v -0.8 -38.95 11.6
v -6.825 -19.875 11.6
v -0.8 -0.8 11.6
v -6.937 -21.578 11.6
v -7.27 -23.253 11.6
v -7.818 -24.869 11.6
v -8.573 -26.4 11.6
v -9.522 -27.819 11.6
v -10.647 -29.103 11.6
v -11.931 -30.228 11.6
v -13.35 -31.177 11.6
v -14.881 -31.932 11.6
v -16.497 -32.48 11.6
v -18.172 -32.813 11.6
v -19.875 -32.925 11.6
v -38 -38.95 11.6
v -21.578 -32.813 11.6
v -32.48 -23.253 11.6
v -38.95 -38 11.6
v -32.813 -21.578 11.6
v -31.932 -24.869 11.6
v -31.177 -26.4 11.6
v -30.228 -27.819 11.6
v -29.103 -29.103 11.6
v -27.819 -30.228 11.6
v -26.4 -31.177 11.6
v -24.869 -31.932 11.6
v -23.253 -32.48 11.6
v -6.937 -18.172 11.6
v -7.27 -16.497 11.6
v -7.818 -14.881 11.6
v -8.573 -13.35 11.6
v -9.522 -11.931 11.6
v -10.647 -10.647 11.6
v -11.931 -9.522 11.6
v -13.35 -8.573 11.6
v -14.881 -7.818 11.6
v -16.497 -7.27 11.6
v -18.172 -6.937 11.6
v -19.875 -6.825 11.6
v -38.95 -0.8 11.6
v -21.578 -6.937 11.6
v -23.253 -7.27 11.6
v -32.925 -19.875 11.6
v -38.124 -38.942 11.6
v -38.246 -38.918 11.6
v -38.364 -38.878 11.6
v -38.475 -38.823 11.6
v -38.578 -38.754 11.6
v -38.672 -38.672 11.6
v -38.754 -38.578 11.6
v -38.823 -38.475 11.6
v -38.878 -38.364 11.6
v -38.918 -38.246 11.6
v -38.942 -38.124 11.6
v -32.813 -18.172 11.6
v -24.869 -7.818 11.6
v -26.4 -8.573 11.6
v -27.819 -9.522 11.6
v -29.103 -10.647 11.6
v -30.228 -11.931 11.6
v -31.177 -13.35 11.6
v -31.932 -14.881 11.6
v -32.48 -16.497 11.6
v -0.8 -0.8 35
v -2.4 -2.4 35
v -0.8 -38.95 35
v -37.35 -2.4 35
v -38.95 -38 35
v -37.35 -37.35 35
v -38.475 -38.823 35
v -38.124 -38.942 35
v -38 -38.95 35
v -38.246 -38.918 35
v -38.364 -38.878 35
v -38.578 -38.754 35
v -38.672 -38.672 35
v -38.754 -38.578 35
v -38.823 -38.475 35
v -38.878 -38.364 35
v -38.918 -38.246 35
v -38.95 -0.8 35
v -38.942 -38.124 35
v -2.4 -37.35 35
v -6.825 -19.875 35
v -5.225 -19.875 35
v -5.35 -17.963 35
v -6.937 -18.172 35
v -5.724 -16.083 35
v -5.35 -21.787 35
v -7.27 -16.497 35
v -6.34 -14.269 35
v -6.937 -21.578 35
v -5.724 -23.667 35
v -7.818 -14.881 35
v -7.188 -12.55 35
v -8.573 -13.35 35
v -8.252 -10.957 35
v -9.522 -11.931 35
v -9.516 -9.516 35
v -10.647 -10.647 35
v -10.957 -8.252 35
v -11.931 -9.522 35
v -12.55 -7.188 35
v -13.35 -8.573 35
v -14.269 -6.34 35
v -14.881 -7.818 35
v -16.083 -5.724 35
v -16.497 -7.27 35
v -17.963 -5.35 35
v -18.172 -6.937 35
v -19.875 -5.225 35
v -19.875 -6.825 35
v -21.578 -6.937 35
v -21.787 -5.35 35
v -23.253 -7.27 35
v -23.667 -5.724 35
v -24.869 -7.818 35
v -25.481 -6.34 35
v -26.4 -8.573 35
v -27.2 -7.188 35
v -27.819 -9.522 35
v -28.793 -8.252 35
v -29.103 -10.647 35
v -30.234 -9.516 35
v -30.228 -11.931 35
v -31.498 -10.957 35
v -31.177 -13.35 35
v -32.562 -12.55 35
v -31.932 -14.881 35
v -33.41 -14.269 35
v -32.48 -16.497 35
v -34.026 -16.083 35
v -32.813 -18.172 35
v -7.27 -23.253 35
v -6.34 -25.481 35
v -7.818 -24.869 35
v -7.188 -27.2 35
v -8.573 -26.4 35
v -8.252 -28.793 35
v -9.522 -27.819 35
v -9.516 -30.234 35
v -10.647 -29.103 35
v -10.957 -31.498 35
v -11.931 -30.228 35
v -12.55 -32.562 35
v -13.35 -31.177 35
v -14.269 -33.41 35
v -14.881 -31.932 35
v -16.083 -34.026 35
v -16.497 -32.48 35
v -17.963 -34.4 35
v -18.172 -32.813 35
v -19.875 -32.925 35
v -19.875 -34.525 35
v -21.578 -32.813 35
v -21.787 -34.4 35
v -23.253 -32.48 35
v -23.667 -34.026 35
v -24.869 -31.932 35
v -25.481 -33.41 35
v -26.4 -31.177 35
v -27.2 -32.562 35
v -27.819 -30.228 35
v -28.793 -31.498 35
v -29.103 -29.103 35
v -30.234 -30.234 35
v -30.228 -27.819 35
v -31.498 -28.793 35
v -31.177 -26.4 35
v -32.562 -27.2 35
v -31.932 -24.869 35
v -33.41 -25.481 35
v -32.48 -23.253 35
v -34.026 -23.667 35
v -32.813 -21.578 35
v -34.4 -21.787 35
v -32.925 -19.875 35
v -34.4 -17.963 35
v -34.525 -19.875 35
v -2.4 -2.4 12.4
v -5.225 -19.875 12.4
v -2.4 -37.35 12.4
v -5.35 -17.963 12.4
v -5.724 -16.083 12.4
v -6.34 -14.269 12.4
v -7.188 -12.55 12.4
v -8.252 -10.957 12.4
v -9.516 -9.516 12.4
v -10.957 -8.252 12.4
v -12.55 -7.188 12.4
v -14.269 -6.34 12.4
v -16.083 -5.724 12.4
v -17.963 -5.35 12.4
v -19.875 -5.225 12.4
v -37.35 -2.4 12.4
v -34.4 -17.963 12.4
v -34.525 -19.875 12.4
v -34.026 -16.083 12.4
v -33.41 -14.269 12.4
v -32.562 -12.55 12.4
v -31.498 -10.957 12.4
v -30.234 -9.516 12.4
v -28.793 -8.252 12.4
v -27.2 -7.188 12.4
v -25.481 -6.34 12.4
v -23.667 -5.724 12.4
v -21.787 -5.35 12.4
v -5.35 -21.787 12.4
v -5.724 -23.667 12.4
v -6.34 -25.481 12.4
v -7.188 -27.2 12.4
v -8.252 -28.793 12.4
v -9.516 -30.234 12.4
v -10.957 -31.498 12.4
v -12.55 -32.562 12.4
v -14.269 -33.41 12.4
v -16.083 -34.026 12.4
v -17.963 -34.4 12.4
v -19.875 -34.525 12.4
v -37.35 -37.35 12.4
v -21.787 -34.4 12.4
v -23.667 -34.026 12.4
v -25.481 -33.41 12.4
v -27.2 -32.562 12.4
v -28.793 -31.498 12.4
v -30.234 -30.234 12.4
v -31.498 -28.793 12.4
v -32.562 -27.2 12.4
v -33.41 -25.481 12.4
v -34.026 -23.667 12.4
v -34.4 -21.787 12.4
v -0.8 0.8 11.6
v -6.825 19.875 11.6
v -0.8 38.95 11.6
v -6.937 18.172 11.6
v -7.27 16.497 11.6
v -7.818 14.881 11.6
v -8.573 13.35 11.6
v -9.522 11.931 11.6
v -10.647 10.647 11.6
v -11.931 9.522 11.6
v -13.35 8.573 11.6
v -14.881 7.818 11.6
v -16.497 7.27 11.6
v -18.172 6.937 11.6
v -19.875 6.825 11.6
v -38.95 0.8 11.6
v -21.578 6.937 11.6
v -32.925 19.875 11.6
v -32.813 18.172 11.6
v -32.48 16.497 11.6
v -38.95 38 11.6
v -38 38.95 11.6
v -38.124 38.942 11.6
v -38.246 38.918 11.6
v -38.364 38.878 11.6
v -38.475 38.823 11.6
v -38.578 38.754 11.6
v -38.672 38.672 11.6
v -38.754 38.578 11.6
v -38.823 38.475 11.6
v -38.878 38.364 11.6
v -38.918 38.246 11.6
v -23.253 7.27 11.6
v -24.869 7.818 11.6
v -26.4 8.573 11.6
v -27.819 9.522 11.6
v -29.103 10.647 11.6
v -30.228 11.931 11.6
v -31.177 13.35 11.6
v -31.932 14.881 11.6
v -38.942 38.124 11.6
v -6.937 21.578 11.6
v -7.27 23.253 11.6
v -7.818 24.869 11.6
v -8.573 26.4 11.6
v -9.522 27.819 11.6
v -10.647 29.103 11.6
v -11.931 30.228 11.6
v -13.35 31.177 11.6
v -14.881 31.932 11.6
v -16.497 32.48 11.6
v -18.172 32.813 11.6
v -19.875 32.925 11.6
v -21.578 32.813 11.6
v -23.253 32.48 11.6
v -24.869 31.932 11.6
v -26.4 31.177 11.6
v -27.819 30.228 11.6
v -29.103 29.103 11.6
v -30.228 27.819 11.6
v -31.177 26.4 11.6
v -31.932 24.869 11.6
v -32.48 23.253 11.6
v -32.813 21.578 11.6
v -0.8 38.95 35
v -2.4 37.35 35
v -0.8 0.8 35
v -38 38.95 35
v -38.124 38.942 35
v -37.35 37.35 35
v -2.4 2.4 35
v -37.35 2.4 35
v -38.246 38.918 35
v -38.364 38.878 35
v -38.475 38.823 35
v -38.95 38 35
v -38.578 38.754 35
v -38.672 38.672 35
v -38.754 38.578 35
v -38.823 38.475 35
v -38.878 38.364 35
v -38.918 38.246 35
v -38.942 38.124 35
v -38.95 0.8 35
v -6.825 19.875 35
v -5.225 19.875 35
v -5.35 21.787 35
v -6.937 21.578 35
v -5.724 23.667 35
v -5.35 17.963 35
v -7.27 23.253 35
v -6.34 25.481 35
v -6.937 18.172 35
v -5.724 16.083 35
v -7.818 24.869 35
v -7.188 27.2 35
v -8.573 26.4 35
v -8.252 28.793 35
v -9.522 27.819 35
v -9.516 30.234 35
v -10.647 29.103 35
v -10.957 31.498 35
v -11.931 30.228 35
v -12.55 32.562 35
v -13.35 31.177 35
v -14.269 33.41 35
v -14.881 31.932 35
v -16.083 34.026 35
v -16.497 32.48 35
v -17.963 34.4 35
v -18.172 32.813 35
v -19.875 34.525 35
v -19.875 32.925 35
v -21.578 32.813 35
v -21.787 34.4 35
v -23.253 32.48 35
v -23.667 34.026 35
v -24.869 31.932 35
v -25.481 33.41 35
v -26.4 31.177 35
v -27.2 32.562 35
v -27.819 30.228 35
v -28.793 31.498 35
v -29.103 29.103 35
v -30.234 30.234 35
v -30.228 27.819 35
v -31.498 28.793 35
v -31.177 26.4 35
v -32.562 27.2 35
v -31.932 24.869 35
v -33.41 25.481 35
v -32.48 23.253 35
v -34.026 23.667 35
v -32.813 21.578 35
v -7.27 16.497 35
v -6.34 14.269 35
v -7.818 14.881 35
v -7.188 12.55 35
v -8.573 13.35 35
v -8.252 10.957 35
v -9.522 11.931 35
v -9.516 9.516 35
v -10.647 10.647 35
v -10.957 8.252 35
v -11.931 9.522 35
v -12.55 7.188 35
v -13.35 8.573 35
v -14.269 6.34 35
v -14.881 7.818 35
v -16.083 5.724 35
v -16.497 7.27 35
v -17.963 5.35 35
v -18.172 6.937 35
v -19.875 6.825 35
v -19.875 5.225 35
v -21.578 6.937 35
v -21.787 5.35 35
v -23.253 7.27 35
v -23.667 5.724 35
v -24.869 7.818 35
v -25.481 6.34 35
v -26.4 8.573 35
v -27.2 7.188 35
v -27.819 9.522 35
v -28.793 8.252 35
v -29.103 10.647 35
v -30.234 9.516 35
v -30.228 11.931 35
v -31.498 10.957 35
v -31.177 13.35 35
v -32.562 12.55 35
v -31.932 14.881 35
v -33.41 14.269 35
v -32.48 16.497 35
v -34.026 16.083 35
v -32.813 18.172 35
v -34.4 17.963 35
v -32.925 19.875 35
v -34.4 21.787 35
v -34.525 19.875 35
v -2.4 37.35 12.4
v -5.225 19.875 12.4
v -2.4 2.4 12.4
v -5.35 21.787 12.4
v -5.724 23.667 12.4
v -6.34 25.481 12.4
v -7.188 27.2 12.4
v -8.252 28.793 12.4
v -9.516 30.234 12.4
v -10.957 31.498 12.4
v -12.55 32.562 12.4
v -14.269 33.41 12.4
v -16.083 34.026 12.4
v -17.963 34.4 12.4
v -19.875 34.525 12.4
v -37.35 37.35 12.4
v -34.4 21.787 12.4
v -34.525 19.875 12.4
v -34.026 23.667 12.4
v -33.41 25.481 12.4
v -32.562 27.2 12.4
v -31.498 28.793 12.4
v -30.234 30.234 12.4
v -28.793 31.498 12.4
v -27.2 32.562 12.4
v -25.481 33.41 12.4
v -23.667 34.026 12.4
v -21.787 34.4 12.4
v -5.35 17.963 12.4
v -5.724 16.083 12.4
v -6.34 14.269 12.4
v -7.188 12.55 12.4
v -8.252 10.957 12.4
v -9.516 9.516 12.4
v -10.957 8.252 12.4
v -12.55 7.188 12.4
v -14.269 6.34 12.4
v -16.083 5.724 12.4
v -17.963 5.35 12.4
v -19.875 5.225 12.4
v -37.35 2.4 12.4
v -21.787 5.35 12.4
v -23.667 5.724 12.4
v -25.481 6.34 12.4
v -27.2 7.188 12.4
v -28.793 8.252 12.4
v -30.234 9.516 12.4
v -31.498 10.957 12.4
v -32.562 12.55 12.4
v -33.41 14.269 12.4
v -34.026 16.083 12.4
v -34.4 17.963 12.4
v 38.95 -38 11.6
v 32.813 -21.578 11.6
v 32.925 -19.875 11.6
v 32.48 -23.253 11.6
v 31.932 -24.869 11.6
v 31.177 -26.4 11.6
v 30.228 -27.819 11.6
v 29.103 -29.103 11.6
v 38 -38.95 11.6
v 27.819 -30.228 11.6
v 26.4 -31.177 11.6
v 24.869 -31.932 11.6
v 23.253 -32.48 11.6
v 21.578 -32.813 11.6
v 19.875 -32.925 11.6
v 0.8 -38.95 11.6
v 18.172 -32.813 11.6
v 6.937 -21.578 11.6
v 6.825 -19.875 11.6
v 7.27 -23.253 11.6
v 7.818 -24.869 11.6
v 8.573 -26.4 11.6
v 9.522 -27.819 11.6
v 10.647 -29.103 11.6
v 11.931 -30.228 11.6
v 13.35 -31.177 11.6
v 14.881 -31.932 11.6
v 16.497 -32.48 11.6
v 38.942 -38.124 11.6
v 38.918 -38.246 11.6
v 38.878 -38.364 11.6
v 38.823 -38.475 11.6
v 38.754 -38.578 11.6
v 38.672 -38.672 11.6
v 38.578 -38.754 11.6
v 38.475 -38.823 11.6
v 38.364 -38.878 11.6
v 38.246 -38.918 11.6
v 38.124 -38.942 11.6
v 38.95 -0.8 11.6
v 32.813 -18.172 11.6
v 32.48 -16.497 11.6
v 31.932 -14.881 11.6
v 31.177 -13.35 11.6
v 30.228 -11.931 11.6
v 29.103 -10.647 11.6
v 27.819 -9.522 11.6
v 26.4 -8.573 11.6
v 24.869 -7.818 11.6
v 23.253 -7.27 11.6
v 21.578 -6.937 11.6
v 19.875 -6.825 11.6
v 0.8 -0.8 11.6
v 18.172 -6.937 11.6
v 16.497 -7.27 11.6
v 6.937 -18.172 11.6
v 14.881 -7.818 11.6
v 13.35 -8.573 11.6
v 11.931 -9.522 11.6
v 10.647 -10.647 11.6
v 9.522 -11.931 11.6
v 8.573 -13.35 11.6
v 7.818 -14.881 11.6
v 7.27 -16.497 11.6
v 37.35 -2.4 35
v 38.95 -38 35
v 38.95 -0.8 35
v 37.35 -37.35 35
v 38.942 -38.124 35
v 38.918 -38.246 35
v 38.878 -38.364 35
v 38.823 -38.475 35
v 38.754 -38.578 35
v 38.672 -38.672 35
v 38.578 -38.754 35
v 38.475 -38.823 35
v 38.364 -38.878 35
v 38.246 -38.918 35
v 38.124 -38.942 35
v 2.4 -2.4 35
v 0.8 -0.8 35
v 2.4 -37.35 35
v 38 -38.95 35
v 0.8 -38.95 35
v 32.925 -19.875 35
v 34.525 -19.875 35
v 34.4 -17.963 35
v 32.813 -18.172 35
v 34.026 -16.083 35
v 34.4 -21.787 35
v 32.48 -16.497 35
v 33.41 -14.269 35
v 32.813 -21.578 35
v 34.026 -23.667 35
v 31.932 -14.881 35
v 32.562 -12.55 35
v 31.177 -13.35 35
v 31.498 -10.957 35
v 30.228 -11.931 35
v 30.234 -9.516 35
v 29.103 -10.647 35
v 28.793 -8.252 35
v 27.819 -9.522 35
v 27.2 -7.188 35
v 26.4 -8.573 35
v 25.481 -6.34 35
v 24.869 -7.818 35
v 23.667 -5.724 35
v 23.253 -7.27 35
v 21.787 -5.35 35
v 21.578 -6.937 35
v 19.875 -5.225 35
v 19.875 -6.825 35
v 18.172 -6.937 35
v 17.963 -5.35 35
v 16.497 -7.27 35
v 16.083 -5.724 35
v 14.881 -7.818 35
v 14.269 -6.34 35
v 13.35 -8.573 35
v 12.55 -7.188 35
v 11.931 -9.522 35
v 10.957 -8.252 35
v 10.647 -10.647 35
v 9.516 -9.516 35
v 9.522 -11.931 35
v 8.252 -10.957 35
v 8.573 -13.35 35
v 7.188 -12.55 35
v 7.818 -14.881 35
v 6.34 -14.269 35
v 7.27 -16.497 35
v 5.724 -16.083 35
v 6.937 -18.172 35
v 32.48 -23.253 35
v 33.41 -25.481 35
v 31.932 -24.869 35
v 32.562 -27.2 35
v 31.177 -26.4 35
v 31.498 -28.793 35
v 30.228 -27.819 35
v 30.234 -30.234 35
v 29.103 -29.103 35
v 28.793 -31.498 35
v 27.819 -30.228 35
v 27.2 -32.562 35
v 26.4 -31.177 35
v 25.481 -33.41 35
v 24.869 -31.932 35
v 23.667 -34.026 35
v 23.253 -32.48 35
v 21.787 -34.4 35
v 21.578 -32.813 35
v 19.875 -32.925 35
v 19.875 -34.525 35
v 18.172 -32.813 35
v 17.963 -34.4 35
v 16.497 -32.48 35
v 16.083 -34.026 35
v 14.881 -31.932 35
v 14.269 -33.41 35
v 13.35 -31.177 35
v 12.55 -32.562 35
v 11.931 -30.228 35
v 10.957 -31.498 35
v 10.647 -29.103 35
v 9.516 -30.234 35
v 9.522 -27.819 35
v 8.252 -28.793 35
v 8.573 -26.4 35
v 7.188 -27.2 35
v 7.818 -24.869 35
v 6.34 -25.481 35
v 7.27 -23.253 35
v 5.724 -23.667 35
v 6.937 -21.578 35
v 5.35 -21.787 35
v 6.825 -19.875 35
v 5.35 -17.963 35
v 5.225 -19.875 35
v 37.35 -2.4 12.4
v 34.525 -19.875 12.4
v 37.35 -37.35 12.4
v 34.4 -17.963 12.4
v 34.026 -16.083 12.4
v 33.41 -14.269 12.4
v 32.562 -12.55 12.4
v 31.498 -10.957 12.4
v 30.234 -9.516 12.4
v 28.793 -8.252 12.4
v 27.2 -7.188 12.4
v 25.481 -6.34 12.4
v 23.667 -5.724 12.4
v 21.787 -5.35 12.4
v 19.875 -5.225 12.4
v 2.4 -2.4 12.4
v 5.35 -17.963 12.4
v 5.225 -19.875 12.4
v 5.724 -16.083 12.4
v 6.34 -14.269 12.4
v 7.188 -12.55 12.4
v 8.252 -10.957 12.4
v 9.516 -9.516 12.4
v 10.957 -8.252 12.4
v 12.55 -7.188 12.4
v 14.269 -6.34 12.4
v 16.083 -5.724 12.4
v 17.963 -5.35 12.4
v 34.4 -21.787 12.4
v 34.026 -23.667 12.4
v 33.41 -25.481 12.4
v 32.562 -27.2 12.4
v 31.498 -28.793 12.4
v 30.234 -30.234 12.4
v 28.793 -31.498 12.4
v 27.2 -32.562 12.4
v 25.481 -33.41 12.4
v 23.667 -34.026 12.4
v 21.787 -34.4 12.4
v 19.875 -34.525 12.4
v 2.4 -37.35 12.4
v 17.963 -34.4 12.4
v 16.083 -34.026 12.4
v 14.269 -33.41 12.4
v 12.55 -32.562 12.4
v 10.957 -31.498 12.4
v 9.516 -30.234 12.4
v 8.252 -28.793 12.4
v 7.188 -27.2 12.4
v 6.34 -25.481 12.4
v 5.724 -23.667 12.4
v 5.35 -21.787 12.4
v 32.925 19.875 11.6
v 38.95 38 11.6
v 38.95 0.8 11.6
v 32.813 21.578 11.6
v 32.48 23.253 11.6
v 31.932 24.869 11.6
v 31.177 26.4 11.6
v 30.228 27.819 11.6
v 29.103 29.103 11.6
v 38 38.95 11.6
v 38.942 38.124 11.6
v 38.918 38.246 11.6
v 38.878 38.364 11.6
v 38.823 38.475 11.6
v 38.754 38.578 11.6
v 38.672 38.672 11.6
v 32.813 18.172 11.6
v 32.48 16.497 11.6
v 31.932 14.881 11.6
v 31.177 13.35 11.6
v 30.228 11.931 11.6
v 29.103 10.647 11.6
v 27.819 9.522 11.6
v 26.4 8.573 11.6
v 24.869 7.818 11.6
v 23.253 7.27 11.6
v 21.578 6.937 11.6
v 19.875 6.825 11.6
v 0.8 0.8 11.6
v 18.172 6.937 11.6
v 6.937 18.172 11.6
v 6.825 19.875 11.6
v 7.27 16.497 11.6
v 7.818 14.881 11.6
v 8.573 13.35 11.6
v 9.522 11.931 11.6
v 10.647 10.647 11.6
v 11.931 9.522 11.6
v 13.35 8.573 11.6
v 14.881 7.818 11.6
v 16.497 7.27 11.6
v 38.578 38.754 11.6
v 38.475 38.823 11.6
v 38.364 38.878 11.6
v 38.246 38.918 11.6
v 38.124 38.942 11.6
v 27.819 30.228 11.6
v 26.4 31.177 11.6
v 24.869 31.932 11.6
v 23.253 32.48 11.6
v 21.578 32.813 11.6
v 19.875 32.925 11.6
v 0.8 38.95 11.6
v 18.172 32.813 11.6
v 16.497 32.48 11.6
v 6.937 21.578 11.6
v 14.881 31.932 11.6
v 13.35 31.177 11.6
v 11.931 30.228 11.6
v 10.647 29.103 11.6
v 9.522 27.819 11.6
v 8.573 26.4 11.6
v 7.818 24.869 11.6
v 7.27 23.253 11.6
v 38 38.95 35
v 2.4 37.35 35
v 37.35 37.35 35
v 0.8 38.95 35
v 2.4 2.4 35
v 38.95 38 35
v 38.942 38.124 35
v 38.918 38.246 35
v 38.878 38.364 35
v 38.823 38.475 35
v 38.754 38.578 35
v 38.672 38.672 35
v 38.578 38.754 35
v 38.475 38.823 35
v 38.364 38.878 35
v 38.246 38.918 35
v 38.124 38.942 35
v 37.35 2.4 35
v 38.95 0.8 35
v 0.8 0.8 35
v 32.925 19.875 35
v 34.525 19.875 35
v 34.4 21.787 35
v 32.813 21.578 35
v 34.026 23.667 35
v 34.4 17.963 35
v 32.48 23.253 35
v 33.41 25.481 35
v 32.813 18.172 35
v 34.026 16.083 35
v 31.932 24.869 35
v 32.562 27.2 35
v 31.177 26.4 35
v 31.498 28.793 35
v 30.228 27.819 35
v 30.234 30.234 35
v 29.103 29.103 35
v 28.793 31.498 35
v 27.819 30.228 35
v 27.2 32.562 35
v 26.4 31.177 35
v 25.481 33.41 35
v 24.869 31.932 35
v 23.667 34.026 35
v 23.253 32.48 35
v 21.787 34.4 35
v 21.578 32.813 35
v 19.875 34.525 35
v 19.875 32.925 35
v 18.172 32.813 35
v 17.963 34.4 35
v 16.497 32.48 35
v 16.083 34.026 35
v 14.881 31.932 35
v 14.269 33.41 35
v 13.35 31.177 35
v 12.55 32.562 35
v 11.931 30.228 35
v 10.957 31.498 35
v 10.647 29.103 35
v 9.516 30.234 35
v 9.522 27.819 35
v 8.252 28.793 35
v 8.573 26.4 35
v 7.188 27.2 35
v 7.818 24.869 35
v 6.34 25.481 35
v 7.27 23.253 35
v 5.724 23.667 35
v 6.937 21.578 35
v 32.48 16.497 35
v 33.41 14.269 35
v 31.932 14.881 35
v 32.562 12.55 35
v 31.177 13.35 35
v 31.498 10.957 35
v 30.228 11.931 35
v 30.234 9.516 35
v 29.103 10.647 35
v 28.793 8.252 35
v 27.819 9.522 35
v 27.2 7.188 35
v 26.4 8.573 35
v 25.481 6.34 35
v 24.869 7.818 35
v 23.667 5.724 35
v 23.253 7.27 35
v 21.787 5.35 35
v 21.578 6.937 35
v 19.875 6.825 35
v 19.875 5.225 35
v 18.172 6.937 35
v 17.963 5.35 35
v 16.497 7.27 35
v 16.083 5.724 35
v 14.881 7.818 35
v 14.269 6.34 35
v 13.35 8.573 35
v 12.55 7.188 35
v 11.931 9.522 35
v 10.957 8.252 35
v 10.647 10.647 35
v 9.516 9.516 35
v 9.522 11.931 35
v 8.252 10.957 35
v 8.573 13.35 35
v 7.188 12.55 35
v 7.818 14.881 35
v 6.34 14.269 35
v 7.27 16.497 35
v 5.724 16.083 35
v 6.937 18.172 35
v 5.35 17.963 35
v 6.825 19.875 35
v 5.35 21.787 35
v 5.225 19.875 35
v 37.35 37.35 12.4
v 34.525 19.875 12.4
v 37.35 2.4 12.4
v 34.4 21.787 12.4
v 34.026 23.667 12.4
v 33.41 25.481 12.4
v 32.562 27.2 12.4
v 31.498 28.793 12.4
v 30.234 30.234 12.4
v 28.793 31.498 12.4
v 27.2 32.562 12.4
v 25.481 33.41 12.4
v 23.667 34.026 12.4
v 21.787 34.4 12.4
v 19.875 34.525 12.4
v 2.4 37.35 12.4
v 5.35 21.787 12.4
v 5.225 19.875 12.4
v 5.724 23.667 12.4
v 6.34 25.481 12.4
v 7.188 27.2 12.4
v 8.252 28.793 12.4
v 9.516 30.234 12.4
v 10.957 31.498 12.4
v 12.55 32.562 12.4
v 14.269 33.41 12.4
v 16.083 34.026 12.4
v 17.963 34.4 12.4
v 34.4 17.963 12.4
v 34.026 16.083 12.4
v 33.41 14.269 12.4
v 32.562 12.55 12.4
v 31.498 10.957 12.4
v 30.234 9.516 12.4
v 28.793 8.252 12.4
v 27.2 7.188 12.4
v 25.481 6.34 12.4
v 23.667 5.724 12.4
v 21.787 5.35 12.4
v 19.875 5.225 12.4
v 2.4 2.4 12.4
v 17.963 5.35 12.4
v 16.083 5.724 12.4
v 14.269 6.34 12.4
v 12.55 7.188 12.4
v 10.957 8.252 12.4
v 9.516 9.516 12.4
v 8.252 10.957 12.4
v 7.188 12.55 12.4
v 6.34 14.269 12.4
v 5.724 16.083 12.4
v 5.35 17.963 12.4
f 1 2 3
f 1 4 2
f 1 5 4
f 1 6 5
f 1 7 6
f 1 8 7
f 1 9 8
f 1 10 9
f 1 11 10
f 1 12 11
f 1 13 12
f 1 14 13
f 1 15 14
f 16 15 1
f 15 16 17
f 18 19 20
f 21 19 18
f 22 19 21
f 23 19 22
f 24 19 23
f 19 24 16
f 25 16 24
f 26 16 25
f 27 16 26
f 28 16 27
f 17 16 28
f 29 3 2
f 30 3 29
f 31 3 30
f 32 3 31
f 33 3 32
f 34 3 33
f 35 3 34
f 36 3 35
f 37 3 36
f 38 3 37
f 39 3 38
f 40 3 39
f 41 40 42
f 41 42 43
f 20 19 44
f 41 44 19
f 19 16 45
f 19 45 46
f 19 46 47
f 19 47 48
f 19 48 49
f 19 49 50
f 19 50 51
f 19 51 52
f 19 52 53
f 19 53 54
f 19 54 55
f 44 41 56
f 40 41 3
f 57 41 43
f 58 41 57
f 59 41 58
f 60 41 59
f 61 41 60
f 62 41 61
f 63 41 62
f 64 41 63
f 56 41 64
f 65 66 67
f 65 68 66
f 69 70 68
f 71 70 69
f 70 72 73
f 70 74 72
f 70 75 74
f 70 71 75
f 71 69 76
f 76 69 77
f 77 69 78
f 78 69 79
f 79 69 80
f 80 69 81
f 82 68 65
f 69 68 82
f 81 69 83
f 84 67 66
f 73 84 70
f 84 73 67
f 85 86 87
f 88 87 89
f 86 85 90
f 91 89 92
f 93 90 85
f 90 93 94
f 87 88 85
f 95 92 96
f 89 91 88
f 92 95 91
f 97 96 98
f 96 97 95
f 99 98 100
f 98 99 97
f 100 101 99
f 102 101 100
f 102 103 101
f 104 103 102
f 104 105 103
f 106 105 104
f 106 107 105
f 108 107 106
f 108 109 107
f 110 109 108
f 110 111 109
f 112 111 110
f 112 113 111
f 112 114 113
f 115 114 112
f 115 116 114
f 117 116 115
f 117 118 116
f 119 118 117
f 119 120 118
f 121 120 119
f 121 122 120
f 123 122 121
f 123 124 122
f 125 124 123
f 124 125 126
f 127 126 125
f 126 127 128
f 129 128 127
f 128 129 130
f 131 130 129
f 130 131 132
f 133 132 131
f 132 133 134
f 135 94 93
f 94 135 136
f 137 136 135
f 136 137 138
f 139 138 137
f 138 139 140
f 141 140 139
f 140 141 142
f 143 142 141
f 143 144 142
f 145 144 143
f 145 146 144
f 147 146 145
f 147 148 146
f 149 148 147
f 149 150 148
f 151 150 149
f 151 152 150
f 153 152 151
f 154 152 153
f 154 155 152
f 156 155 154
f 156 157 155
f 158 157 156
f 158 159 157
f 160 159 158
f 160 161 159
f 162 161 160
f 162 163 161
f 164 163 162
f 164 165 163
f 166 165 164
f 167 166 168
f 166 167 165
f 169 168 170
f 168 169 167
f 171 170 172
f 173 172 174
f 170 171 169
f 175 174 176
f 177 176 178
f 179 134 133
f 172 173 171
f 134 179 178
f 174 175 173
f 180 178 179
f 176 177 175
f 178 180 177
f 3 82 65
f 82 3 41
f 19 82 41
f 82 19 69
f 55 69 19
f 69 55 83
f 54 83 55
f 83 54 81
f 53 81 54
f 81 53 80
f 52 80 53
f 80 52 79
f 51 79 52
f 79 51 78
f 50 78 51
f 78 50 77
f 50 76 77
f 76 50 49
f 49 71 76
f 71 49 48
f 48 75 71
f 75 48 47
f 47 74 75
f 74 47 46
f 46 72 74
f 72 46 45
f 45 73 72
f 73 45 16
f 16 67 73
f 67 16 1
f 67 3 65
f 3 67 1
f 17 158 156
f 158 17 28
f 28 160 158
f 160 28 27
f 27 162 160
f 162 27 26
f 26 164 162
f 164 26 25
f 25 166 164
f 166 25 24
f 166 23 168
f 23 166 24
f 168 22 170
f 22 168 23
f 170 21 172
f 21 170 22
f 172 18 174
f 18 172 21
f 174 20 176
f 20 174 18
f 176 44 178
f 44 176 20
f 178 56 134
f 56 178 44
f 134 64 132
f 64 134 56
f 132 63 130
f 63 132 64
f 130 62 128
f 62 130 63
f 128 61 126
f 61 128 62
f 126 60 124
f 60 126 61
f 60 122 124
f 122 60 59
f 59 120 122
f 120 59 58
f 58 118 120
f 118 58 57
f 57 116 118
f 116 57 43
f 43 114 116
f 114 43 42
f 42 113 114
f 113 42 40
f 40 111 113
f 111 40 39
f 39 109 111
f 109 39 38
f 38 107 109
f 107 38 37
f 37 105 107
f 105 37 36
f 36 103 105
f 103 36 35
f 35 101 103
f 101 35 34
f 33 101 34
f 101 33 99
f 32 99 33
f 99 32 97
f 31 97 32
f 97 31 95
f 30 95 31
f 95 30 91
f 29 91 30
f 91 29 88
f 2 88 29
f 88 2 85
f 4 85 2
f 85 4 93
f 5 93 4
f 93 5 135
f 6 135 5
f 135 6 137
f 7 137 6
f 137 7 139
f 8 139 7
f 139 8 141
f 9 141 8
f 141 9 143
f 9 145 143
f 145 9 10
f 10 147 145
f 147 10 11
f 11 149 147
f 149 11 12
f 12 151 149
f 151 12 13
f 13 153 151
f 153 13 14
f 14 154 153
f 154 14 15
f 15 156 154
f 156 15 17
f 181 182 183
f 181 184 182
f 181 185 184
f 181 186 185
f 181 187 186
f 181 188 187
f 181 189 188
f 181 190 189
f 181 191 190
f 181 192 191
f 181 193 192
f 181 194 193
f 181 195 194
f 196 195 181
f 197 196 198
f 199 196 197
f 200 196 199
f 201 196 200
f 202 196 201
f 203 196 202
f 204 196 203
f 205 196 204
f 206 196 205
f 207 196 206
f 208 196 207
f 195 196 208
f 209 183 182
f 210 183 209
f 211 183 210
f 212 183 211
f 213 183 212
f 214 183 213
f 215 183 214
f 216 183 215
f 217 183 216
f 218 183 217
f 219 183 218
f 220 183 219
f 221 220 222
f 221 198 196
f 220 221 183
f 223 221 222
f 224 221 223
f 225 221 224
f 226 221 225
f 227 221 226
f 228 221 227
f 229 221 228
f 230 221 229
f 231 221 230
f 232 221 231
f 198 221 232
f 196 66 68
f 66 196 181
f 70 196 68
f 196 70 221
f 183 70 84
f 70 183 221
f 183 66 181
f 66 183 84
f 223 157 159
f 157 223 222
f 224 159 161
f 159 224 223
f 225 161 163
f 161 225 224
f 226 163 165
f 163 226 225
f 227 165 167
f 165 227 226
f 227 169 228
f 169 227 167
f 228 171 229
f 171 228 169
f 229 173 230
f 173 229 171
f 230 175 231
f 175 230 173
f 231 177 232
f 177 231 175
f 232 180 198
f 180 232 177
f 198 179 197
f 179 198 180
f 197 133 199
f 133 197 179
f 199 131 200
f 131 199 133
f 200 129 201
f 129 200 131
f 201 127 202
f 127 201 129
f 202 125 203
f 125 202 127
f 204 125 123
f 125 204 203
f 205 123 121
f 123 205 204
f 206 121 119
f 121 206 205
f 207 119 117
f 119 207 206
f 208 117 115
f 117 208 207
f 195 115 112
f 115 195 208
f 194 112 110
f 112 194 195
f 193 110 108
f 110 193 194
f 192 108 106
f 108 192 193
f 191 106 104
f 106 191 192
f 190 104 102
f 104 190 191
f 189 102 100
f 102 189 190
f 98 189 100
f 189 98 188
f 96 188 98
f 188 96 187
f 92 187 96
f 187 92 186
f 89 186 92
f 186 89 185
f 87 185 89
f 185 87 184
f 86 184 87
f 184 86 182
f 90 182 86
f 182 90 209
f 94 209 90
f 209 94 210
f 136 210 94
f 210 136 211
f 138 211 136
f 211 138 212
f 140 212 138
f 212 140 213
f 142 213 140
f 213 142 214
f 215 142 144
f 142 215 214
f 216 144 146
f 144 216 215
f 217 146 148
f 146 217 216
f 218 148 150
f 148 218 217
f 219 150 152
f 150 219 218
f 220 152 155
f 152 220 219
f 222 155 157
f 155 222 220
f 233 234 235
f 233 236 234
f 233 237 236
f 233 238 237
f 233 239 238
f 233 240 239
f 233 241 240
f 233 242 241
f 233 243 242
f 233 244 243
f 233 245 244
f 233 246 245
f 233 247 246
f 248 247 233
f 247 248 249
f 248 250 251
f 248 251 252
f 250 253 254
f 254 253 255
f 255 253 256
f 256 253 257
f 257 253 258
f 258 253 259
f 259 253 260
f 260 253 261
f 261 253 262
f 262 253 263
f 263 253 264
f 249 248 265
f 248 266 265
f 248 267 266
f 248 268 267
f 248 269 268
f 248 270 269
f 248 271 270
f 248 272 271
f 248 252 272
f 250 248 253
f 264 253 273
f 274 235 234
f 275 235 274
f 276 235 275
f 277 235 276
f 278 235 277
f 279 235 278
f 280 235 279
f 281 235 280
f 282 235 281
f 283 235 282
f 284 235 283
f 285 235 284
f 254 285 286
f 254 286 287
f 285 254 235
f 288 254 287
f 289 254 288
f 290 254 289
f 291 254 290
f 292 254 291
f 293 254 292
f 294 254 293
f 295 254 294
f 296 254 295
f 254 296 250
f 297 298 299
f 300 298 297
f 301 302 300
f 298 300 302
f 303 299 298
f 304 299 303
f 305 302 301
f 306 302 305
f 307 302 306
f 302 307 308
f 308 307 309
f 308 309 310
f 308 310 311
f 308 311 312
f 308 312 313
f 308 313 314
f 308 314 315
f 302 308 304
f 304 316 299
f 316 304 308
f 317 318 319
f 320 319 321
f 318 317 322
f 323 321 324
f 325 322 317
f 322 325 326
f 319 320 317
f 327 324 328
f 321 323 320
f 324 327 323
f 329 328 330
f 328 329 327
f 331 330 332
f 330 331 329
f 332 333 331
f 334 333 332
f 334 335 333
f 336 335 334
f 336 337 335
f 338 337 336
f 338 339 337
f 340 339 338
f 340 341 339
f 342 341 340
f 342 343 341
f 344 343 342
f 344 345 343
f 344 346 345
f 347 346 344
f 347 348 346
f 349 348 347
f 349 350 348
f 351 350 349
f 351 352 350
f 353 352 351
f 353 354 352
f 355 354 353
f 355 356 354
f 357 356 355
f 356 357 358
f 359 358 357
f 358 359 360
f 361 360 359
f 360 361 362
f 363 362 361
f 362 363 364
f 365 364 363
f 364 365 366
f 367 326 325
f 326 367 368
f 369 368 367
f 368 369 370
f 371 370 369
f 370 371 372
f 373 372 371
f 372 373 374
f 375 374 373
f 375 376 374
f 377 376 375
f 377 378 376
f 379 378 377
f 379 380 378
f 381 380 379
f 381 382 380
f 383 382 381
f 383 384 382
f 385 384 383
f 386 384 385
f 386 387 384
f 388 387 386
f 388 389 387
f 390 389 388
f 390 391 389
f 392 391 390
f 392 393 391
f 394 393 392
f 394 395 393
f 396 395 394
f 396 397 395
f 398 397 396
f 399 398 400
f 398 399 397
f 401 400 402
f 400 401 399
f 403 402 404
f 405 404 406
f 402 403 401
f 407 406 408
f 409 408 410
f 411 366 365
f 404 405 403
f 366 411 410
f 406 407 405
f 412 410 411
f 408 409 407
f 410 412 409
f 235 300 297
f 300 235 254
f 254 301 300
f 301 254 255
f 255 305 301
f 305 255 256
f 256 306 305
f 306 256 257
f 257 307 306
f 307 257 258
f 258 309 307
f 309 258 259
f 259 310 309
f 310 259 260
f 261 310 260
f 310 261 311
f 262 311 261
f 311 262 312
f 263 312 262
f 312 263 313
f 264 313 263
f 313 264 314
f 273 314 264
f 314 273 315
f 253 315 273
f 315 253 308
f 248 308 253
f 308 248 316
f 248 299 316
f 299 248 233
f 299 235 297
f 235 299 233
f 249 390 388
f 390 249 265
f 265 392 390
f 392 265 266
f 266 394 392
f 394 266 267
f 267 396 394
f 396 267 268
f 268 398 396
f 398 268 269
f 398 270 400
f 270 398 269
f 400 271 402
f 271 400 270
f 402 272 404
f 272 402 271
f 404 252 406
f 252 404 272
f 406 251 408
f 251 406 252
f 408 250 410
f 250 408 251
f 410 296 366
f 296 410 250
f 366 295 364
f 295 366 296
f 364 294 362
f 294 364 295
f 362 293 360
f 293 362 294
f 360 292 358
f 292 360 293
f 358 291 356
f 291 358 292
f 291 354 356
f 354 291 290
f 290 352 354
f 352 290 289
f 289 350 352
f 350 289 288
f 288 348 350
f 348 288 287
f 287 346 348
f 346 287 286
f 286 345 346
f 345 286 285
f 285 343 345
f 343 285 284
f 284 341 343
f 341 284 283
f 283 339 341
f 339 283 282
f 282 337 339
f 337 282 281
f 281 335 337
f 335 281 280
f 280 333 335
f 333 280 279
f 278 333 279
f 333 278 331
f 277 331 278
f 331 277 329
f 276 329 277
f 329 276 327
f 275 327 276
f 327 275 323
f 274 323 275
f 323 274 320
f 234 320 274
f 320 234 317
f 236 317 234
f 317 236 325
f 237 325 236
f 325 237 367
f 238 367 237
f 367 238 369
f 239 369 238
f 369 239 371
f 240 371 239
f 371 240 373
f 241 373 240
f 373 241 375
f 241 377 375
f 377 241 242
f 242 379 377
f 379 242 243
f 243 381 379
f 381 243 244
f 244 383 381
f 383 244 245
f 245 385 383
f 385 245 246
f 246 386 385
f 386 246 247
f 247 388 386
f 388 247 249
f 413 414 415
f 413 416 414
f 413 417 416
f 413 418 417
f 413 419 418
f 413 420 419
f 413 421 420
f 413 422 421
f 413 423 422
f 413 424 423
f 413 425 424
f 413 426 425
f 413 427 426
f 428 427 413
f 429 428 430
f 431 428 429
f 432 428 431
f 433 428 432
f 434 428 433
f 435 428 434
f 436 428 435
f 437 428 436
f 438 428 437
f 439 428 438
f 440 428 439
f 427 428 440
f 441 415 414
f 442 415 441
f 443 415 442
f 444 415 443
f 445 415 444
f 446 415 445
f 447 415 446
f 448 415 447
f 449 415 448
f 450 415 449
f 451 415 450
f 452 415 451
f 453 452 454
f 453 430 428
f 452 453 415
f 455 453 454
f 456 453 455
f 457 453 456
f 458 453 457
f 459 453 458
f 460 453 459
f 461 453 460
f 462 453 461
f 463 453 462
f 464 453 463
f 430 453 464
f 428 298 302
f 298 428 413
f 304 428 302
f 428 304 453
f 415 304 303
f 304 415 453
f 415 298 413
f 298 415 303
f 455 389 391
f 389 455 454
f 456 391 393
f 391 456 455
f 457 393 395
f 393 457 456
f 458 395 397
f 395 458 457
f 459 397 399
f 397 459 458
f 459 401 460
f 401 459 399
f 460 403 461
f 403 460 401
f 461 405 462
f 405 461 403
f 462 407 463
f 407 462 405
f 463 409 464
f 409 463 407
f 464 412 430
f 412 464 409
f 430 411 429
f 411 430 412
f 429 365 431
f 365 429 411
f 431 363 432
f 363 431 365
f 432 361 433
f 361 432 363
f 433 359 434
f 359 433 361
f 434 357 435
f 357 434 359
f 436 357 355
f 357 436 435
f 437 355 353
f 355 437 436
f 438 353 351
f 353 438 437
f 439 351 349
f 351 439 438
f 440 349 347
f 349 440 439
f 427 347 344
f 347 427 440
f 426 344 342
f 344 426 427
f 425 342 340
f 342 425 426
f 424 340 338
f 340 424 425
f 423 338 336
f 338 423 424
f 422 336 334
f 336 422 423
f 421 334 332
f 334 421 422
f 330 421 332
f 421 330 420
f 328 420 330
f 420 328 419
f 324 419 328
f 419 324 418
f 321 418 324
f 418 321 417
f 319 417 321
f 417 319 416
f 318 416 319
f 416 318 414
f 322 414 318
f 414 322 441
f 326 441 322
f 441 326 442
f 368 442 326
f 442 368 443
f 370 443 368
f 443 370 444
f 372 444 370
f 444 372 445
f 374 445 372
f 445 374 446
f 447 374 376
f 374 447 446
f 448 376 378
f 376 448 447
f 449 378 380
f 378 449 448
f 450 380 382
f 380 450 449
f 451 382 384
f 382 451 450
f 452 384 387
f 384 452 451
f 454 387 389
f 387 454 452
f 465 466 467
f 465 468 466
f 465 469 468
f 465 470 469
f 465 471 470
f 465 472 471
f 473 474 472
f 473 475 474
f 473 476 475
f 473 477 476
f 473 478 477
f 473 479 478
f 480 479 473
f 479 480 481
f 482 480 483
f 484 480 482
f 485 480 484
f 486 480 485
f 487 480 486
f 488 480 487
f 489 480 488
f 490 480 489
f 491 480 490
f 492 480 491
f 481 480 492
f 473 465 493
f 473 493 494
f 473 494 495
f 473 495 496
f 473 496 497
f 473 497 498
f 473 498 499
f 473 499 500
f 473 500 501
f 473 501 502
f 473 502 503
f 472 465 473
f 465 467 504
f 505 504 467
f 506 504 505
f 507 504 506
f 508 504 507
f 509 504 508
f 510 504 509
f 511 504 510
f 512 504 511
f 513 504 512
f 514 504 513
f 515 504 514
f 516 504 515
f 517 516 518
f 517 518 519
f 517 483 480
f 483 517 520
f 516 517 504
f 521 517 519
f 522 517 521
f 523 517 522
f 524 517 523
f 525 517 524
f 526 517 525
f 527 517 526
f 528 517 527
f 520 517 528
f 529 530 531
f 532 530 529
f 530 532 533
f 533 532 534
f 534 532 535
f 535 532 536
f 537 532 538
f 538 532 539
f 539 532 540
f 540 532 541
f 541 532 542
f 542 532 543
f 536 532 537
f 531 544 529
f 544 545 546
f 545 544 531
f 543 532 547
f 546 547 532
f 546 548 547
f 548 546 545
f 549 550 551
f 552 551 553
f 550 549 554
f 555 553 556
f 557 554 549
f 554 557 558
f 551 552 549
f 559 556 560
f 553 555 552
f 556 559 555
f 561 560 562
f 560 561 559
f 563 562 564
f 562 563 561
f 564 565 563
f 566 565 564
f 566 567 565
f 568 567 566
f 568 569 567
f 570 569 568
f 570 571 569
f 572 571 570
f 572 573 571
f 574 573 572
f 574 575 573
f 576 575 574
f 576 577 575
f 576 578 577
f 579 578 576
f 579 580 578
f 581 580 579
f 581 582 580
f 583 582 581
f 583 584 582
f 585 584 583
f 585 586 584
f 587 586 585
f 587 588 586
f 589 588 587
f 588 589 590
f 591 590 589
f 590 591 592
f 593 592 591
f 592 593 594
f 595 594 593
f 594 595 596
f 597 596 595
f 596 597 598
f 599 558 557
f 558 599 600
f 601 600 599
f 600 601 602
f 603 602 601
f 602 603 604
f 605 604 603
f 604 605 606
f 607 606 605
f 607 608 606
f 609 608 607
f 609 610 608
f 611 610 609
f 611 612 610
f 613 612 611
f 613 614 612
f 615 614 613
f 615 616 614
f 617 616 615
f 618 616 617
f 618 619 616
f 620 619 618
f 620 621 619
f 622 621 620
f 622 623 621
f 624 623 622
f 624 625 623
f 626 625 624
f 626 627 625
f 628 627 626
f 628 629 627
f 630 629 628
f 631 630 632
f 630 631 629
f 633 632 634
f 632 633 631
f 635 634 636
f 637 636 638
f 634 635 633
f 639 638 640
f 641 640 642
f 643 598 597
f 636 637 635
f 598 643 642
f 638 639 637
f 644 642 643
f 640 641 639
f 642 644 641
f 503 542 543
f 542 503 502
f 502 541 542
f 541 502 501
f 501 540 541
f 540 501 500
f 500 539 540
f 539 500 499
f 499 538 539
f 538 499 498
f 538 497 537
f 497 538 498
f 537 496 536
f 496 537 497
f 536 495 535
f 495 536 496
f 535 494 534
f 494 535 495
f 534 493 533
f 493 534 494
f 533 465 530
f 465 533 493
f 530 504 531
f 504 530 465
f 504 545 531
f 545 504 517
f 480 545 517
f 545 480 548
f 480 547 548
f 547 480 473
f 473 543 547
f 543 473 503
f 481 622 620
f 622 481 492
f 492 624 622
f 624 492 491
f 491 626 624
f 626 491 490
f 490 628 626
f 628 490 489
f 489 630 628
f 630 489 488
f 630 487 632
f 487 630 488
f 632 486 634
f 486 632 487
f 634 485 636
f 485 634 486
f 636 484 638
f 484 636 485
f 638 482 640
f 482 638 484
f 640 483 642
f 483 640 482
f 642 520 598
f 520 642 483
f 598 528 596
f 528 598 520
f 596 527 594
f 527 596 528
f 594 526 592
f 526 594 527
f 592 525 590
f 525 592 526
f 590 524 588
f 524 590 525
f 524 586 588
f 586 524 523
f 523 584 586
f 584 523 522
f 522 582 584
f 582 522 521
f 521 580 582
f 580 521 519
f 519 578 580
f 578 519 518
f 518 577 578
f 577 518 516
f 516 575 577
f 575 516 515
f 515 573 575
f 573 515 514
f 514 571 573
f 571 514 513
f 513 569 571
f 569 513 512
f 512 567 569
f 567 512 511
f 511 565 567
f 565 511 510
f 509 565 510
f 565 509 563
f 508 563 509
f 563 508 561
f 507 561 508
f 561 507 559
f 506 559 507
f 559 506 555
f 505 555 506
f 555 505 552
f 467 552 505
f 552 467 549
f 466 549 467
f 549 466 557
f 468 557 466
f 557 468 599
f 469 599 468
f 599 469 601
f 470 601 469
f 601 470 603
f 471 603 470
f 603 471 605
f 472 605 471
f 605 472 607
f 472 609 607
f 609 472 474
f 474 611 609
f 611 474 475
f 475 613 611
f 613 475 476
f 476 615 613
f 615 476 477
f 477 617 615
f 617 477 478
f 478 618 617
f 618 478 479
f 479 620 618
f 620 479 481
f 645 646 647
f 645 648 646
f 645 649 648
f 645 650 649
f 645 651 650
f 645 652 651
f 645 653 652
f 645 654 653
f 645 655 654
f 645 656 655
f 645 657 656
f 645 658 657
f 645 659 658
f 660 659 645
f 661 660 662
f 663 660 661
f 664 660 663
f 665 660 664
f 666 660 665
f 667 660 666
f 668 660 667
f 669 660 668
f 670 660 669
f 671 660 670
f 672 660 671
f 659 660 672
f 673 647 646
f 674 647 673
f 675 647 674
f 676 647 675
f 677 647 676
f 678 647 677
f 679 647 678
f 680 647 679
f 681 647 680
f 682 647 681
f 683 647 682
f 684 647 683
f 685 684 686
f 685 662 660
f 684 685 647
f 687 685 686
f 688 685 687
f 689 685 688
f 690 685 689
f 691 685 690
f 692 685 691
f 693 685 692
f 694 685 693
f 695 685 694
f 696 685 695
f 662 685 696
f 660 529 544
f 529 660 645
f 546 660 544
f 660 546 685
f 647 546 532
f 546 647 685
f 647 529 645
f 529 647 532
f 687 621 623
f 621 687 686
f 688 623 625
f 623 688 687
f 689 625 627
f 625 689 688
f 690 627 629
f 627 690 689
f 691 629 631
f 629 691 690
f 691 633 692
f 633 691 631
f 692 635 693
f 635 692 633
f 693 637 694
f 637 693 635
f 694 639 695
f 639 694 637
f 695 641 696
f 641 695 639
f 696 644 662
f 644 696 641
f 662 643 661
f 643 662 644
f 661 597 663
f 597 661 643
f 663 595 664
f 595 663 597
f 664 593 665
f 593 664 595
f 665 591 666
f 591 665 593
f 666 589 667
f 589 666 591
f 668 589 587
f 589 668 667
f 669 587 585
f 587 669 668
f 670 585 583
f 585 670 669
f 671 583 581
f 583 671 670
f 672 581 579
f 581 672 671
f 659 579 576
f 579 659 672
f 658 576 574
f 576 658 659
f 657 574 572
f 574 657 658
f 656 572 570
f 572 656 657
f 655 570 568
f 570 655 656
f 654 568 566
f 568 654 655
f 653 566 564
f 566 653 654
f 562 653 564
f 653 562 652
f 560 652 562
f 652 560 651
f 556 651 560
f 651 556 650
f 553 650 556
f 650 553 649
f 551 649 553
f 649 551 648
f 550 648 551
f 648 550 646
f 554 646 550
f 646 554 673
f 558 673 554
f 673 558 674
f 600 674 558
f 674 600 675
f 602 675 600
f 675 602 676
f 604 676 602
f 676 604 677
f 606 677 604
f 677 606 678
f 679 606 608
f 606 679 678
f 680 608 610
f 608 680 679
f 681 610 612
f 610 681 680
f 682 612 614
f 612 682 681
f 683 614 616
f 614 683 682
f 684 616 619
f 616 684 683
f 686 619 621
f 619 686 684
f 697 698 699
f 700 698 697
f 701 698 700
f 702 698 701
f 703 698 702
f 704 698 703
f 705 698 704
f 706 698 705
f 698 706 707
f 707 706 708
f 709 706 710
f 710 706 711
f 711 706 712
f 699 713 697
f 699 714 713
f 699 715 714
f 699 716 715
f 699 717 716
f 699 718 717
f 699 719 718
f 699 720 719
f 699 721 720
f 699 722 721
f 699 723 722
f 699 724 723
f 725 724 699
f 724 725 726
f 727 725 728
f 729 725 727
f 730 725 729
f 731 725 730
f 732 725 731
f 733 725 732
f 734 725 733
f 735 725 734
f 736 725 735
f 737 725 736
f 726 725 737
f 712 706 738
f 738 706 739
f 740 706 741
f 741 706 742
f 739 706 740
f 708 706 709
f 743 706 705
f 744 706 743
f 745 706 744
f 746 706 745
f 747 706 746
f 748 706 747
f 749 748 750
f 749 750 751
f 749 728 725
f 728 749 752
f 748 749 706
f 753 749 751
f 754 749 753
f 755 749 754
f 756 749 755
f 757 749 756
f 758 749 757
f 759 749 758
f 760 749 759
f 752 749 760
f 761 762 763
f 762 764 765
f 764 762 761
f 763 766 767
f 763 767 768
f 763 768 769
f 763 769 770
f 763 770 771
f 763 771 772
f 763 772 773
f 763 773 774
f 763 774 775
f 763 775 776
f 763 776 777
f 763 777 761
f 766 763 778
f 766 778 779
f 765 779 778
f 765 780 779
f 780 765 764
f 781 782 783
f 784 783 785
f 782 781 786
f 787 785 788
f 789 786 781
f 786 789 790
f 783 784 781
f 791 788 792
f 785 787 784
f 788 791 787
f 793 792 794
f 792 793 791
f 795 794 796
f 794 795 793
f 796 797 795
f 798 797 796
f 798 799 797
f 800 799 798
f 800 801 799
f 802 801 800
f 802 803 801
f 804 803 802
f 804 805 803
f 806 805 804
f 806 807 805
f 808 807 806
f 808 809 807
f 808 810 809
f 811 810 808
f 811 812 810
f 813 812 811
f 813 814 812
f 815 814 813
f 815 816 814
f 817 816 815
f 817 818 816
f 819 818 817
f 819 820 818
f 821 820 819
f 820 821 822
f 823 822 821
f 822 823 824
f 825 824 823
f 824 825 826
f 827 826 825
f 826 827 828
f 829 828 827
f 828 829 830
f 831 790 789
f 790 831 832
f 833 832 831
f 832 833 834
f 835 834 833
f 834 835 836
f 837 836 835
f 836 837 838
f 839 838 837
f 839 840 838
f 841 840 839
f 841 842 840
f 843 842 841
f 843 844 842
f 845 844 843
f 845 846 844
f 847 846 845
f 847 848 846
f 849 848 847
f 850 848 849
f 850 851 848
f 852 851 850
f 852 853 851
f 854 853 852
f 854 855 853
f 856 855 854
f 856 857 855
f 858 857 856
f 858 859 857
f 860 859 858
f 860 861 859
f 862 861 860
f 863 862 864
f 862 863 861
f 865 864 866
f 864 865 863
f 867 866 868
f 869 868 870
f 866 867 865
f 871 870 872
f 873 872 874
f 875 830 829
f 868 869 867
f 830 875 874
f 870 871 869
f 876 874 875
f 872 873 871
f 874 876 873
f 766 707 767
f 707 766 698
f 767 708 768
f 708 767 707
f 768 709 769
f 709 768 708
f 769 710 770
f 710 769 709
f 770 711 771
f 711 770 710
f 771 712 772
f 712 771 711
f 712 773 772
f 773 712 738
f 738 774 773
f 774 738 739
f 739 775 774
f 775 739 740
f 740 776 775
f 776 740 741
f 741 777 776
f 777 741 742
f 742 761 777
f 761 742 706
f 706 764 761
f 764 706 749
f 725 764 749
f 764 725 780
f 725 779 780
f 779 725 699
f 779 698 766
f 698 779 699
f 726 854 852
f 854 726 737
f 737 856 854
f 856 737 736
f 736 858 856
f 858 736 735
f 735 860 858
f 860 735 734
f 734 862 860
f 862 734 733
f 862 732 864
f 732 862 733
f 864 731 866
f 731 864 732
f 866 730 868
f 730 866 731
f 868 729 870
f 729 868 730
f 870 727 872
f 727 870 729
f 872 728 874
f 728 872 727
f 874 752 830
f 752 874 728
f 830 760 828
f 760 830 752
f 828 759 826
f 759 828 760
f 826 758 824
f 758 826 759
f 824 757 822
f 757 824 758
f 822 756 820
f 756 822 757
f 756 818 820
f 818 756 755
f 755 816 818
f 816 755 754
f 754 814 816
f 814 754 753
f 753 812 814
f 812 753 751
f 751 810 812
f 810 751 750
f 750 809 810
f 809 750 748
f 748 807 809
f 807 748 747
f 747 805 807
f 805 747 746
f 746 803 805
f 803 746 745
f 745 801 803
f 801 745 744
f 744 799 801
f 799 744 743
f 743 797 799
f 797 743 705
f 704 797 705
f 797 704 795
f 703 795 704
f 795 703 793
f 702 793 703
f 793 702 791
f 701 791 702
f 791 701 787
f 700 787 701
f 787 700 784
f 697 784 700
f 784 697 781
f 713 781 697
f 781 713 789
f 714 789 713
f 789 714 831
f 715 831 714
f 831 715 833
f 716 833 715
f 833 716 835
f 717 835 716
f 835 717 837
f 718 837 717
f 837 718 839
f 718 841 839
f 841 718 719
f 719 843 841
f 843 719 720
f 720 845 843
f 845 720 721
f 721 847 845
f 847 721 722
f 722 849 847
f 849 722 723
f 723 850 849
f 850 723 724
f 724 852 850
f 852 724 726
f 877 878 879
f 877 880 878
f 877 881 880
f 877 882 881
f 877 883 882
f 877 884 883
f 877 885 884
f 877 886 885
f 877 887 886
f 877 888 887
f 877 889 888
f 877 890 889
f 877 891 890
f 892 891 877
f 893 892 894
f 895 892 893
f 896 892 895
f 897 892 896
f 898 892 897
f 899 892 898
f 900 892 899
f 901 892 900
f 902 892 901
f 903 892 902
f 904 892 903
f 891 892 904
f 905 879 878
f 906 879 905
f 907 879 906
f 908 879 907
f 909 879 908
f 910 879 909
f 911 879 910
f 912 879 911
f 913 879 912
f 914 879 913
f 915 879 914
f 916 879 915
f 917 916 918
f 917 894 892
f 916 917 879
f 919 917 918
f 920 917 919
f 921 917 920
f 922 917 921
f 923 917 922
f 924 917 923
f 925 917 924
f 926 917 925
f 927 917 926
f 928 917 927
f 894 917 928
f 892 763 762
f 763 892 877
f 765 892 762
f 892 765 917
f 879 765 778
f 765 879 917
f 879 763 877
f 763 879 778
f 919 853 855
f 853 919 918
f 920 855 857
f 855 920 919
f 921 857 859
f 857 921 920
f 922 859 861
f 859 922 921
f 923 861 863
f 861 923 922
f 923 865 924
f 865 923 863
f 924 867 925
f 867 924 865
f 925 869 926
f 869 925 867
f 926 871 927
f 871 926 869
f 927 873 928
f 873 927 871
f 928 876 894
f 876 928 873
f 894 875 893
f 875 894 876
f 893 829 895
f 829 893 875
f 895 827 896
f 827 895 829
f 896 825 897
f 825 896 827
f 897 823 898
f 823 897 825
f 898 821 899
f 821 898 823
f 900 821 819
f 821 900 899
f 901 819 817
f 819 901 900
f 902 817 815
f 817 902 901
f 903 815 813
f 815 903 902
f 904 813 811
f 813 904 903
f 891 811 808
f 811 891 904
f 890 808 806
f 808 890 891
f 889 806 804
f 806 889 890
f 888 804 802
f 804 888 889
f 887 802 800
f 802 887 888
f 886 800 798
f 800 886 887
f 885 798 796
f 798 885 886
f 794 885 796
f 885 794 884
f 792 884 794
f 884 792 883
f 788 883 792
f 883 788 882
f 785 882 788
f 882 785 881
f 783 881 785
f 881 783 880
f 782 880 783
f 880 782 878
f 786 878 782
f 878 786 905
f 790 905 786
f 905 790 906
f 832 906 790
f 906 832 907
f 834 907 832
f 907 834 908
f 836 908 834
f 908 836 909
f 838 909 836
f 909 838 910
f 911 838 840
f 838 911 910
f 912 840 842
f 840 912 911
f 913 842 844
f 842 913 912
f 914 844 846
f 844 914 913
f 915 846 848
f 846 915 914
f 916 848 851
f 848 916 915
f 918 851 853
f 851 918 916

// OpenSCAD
// file: bin.scad
// Basic Gridfinity bin: one foot per cell, a hollow body and an optional stacking lip.
include <../lib/constants.scad>
include <../lib/printer.scad>
use <../lib/profile.scad>

/* [Bin] */
cells_x = 1;
cells_y = 1;
units_z = 3;       // height in 7 mm units, lip not included
lip     = true;    // stacking lip on top
magnets = false;   // magnet holes under each foot

assert(fits_bed([cells_x * GRID, cells_y * GRID, units_z * UNIT_Z + LIP_H]),
       "Bin is larger than the printer bed");

bin(cells_x, cells_y, units_z, lip, magnets);

module bin(nx = 1, ny = 1, uz = 3, lip = true, magnets = false) {
    assert(uz >= 2, "A bin needs at least 2 height units to have a cavity");

    outer = [nx * GRID - CLEARANCE, ny * GRID - CLEARANCE];
    top   = uz * UNIT_Z;
    lip_h = lip ? LIP_H - LIP_TRIM : 0;

    render(convexity = 4) difference() {
        union() {
            grid_copies(nx, ny) foot();
            translate([0, 0, FOOT_H - EPS])
                linear_extrude(top - FOOT_H + lip_h + EPS) rounded_rect(outer, BIN_R);
        }

        if (lip) {
            // Cavity narrows at 45 degrees under the lip so the overhang prints without support.
            stepped_solid(outer, BIN_R, [
                [FLOOR_Z, WALL],
                [top - (LIP_INSET - WALL), WALL],
                [top, LIP_INSET],
            ]);
            // The lip is the baseplate socket, so a bin stacks exactly as it sits on a plate.
            translate([0, 0, top - EPS]) socket([nx * GRID, ny * GRID]);
        } else {
            stepped_solid(outer, BIN_R, [[FLOOR_Z, WALL], [top + 1, WALL]]);
        }

        if (magnets)
            grid_copies(nx, ny)
                for (sx = [-1, 1], sy = [-1, 1])
                    translate([sx * MAGNET_OFFSET, sy * MAGNET_OFFSET, -EPS])
                        cylinder(d = MAGNET_D, h = MAGNET_H + EPS);
    }
}
// file: ../lib/profile.scad
// Shared geometry: the foot and socket shapes every part is built from.
include <constants.scad>

// 2D rectangle of the given outer size with rounded corners, centred on the origin.
module rounded_rect(size, r) {
    offset(r = r) square([size.x - 2 * r, size.y - 2 * r], center = true);
}

// Solid whose outline shrinks with height according to `profile`,
// a bottom-to-top list of [z, inset from `size`]. Corner radius follows the inset.
module stepped_solid(size, r, profile) {
    for (i = [0 : len(profile) - 2]) {
        a = profile[i];
        b = profile[i + 1];
        hull() {
            translate([0, 0, a[0]])
                linear_extrude(EPS) rounded_rect(size - 2 * [a[1], a[1]], r - a[1]);
            translate([0, 0, b[0] - EPS])
                linear_extrude(EPS) rounded_rect(size - 2 * [b[1], b[1]], r - b[1]);
        }
    }
}

// One bin foot, sitting on z = 0, centred on its cell.
module foot() {
    stepped_solid([GRID - CLEARANCE, GRID - CLEARANCE], BIN_R, FOOT_PROFILE);
}

// Negative volume a foot drops into. `size` is the full grid area it spans.
// With through = true it is extended above and below so it cuts clean through a plate.
module socket(size = [GRID, GRID], through = false) {
    lo = SOCKET_PROFILE[0];
    hi = SOCKET_PROFILE[len(SOCKET_PROFILE) - 1];
    profile = through
        ? concat([[lo[0] - 1, lo[1]]], SOCKET_PROFILE, [[hi[0] + 1, hi[1]]])
        : SOCKET_PROFILE;
    stepped_solid(size, SOCKET_R, profile);
}

// Repeat children once per cell of an nx-by-ny grid centred on the origin.
module grid_copies(nx, ny) {
    for (i = [0 : nx - 1], j = [0 : ny - 1])
        translate([(i - (nx - 1) / 2) * GRID, (j - (ny - 1) / 2) * GRID, 0])
            children();
}
// file: ../lib/printer.scad
// Printer limits and the logic for splitting large parts to fit the bed.
// Values are for a Bambu Lab P2S; change them here if the printer changes.
include <constants.scad>

BED        = [256, 256, 256];   // build volume, mm
BED_MARGIN = 5;                 // space kept free at each bed edge (5 -> 5x5 cells max, 2 -> 6x6)

// Largest number of whole grid cells that fit along one bed axis (0 = X, 1 = Y).
function max_cells(axis) = floor((BED[axis] - 2 * BED_MARGIN) / GRID);

// True when a part of the given [x, y, z] size fits the bed.
function fits_bed(size) =
    size.x <= BED.x - 2 * BED_MARGIN &&
    size.y <= BED.y - 2 * BED_MARGIN &&
    (len(size) < 3 || size.z <= BED.z);

// Split n cells into the fewest runs of at most `limit` cells, as evenly as possible.
// split_cells(13, 5) -> [5, 4, 4]
function split_cells(n, limit) =
    let (count = ceil(n / limit), base = floor(n / count), extra = n - base * count)
    [for (i = [0 : count - 1]) base + (i < extra ? 1 : 0)];

// Sum of the first `count` entries of a list.
function sum_first(v, count) = count <= 0 ? 0 : v[count - 1] + sum_first(v, count - 1);
// file: ../lib/constants.scad
// Gridfinity standard dimensions (mm). Single source of truth:
// every other file includes this one and never hardcodes these numbers.

GRID      = 42;     // X/Y pitch of one cell
UNIT_Z    = 7;      // height of one "u"
CLEARANCE = 0.5;    // total X/Y gap between a bin and its grid space (0.25 per side)

// Bin foot: stepped chamfer, listed bottom to top as [z, inset from the foot's top outline].
FOOT_PROFILE = [[0, 2.95], [0.8, 2.15], [2.6, 2.15], [4.75, 0]];
FOOT_H       = 4.75;
BIN_R        = 3.75;   // outer corner radius of a bin

// Socket (baseplate cell and stacking lip): [z, inset from the 42 mm grid outline].
SOCKET_PROFILE = [[0, 2.85], [0.7, 2.15], [2.5, 2.15], [4.65, 0]];
SOCKET_H       = 4.65;
SOCKET_R       = 4;    // corner radius at the top of a socket

// Bin body
WALL      = 0.95;   // wall thickness
FLOOR_Z   = 7;      // top of the bin floor, measured from the bottom of the foot
LIP_H     = 4.4;    // nominal stacking-lip height above the bin body
LIP_TRIM  = 0.4;    // shave the knife edge off the lip tip so it prints cleanly
LIP_INSET = SOCKET_PROFILE[0][1] - CLEARANCE / 2;   // lip overhang from the outer wall (2.6)

// Magnets (optional)
MAGNET_D      = 6.5;
MAGNET_H      = 2.4;
MAGNET_OFFSET = 13;   // hole centre distance from the cell centre, in X and Y

EPS = 0.01;   // overlap used to avoid coincident faces in boolean cuts
$fn = 48;
// main file
// Clear sleeves that hold jars upright in a smart bin and carry the floor light up round
// each jar. Optional: print them as needed, in clear filament. Set the bin they go into
// and the jar diameter. One file holds one sleeve per compartment.
include <../lib/constants.scad>
include <../lib/smart.scad>
use <smart_bin.scad>

/* [Bin the sleeves go into] */
cells_x = 2;
cells_y = 2;
units_z = 5;
compartments_x = 2;
compartments_y = 2;

/* [Jar] */
jar_diameter = 25.1;   // 25.1 paint jar, 48.2 large bottle

color("white", 0.7)
    smart_bin_sleeve(cells_x, cells_y, units_z, compartments_x, compartments_y, jar_diameter);
